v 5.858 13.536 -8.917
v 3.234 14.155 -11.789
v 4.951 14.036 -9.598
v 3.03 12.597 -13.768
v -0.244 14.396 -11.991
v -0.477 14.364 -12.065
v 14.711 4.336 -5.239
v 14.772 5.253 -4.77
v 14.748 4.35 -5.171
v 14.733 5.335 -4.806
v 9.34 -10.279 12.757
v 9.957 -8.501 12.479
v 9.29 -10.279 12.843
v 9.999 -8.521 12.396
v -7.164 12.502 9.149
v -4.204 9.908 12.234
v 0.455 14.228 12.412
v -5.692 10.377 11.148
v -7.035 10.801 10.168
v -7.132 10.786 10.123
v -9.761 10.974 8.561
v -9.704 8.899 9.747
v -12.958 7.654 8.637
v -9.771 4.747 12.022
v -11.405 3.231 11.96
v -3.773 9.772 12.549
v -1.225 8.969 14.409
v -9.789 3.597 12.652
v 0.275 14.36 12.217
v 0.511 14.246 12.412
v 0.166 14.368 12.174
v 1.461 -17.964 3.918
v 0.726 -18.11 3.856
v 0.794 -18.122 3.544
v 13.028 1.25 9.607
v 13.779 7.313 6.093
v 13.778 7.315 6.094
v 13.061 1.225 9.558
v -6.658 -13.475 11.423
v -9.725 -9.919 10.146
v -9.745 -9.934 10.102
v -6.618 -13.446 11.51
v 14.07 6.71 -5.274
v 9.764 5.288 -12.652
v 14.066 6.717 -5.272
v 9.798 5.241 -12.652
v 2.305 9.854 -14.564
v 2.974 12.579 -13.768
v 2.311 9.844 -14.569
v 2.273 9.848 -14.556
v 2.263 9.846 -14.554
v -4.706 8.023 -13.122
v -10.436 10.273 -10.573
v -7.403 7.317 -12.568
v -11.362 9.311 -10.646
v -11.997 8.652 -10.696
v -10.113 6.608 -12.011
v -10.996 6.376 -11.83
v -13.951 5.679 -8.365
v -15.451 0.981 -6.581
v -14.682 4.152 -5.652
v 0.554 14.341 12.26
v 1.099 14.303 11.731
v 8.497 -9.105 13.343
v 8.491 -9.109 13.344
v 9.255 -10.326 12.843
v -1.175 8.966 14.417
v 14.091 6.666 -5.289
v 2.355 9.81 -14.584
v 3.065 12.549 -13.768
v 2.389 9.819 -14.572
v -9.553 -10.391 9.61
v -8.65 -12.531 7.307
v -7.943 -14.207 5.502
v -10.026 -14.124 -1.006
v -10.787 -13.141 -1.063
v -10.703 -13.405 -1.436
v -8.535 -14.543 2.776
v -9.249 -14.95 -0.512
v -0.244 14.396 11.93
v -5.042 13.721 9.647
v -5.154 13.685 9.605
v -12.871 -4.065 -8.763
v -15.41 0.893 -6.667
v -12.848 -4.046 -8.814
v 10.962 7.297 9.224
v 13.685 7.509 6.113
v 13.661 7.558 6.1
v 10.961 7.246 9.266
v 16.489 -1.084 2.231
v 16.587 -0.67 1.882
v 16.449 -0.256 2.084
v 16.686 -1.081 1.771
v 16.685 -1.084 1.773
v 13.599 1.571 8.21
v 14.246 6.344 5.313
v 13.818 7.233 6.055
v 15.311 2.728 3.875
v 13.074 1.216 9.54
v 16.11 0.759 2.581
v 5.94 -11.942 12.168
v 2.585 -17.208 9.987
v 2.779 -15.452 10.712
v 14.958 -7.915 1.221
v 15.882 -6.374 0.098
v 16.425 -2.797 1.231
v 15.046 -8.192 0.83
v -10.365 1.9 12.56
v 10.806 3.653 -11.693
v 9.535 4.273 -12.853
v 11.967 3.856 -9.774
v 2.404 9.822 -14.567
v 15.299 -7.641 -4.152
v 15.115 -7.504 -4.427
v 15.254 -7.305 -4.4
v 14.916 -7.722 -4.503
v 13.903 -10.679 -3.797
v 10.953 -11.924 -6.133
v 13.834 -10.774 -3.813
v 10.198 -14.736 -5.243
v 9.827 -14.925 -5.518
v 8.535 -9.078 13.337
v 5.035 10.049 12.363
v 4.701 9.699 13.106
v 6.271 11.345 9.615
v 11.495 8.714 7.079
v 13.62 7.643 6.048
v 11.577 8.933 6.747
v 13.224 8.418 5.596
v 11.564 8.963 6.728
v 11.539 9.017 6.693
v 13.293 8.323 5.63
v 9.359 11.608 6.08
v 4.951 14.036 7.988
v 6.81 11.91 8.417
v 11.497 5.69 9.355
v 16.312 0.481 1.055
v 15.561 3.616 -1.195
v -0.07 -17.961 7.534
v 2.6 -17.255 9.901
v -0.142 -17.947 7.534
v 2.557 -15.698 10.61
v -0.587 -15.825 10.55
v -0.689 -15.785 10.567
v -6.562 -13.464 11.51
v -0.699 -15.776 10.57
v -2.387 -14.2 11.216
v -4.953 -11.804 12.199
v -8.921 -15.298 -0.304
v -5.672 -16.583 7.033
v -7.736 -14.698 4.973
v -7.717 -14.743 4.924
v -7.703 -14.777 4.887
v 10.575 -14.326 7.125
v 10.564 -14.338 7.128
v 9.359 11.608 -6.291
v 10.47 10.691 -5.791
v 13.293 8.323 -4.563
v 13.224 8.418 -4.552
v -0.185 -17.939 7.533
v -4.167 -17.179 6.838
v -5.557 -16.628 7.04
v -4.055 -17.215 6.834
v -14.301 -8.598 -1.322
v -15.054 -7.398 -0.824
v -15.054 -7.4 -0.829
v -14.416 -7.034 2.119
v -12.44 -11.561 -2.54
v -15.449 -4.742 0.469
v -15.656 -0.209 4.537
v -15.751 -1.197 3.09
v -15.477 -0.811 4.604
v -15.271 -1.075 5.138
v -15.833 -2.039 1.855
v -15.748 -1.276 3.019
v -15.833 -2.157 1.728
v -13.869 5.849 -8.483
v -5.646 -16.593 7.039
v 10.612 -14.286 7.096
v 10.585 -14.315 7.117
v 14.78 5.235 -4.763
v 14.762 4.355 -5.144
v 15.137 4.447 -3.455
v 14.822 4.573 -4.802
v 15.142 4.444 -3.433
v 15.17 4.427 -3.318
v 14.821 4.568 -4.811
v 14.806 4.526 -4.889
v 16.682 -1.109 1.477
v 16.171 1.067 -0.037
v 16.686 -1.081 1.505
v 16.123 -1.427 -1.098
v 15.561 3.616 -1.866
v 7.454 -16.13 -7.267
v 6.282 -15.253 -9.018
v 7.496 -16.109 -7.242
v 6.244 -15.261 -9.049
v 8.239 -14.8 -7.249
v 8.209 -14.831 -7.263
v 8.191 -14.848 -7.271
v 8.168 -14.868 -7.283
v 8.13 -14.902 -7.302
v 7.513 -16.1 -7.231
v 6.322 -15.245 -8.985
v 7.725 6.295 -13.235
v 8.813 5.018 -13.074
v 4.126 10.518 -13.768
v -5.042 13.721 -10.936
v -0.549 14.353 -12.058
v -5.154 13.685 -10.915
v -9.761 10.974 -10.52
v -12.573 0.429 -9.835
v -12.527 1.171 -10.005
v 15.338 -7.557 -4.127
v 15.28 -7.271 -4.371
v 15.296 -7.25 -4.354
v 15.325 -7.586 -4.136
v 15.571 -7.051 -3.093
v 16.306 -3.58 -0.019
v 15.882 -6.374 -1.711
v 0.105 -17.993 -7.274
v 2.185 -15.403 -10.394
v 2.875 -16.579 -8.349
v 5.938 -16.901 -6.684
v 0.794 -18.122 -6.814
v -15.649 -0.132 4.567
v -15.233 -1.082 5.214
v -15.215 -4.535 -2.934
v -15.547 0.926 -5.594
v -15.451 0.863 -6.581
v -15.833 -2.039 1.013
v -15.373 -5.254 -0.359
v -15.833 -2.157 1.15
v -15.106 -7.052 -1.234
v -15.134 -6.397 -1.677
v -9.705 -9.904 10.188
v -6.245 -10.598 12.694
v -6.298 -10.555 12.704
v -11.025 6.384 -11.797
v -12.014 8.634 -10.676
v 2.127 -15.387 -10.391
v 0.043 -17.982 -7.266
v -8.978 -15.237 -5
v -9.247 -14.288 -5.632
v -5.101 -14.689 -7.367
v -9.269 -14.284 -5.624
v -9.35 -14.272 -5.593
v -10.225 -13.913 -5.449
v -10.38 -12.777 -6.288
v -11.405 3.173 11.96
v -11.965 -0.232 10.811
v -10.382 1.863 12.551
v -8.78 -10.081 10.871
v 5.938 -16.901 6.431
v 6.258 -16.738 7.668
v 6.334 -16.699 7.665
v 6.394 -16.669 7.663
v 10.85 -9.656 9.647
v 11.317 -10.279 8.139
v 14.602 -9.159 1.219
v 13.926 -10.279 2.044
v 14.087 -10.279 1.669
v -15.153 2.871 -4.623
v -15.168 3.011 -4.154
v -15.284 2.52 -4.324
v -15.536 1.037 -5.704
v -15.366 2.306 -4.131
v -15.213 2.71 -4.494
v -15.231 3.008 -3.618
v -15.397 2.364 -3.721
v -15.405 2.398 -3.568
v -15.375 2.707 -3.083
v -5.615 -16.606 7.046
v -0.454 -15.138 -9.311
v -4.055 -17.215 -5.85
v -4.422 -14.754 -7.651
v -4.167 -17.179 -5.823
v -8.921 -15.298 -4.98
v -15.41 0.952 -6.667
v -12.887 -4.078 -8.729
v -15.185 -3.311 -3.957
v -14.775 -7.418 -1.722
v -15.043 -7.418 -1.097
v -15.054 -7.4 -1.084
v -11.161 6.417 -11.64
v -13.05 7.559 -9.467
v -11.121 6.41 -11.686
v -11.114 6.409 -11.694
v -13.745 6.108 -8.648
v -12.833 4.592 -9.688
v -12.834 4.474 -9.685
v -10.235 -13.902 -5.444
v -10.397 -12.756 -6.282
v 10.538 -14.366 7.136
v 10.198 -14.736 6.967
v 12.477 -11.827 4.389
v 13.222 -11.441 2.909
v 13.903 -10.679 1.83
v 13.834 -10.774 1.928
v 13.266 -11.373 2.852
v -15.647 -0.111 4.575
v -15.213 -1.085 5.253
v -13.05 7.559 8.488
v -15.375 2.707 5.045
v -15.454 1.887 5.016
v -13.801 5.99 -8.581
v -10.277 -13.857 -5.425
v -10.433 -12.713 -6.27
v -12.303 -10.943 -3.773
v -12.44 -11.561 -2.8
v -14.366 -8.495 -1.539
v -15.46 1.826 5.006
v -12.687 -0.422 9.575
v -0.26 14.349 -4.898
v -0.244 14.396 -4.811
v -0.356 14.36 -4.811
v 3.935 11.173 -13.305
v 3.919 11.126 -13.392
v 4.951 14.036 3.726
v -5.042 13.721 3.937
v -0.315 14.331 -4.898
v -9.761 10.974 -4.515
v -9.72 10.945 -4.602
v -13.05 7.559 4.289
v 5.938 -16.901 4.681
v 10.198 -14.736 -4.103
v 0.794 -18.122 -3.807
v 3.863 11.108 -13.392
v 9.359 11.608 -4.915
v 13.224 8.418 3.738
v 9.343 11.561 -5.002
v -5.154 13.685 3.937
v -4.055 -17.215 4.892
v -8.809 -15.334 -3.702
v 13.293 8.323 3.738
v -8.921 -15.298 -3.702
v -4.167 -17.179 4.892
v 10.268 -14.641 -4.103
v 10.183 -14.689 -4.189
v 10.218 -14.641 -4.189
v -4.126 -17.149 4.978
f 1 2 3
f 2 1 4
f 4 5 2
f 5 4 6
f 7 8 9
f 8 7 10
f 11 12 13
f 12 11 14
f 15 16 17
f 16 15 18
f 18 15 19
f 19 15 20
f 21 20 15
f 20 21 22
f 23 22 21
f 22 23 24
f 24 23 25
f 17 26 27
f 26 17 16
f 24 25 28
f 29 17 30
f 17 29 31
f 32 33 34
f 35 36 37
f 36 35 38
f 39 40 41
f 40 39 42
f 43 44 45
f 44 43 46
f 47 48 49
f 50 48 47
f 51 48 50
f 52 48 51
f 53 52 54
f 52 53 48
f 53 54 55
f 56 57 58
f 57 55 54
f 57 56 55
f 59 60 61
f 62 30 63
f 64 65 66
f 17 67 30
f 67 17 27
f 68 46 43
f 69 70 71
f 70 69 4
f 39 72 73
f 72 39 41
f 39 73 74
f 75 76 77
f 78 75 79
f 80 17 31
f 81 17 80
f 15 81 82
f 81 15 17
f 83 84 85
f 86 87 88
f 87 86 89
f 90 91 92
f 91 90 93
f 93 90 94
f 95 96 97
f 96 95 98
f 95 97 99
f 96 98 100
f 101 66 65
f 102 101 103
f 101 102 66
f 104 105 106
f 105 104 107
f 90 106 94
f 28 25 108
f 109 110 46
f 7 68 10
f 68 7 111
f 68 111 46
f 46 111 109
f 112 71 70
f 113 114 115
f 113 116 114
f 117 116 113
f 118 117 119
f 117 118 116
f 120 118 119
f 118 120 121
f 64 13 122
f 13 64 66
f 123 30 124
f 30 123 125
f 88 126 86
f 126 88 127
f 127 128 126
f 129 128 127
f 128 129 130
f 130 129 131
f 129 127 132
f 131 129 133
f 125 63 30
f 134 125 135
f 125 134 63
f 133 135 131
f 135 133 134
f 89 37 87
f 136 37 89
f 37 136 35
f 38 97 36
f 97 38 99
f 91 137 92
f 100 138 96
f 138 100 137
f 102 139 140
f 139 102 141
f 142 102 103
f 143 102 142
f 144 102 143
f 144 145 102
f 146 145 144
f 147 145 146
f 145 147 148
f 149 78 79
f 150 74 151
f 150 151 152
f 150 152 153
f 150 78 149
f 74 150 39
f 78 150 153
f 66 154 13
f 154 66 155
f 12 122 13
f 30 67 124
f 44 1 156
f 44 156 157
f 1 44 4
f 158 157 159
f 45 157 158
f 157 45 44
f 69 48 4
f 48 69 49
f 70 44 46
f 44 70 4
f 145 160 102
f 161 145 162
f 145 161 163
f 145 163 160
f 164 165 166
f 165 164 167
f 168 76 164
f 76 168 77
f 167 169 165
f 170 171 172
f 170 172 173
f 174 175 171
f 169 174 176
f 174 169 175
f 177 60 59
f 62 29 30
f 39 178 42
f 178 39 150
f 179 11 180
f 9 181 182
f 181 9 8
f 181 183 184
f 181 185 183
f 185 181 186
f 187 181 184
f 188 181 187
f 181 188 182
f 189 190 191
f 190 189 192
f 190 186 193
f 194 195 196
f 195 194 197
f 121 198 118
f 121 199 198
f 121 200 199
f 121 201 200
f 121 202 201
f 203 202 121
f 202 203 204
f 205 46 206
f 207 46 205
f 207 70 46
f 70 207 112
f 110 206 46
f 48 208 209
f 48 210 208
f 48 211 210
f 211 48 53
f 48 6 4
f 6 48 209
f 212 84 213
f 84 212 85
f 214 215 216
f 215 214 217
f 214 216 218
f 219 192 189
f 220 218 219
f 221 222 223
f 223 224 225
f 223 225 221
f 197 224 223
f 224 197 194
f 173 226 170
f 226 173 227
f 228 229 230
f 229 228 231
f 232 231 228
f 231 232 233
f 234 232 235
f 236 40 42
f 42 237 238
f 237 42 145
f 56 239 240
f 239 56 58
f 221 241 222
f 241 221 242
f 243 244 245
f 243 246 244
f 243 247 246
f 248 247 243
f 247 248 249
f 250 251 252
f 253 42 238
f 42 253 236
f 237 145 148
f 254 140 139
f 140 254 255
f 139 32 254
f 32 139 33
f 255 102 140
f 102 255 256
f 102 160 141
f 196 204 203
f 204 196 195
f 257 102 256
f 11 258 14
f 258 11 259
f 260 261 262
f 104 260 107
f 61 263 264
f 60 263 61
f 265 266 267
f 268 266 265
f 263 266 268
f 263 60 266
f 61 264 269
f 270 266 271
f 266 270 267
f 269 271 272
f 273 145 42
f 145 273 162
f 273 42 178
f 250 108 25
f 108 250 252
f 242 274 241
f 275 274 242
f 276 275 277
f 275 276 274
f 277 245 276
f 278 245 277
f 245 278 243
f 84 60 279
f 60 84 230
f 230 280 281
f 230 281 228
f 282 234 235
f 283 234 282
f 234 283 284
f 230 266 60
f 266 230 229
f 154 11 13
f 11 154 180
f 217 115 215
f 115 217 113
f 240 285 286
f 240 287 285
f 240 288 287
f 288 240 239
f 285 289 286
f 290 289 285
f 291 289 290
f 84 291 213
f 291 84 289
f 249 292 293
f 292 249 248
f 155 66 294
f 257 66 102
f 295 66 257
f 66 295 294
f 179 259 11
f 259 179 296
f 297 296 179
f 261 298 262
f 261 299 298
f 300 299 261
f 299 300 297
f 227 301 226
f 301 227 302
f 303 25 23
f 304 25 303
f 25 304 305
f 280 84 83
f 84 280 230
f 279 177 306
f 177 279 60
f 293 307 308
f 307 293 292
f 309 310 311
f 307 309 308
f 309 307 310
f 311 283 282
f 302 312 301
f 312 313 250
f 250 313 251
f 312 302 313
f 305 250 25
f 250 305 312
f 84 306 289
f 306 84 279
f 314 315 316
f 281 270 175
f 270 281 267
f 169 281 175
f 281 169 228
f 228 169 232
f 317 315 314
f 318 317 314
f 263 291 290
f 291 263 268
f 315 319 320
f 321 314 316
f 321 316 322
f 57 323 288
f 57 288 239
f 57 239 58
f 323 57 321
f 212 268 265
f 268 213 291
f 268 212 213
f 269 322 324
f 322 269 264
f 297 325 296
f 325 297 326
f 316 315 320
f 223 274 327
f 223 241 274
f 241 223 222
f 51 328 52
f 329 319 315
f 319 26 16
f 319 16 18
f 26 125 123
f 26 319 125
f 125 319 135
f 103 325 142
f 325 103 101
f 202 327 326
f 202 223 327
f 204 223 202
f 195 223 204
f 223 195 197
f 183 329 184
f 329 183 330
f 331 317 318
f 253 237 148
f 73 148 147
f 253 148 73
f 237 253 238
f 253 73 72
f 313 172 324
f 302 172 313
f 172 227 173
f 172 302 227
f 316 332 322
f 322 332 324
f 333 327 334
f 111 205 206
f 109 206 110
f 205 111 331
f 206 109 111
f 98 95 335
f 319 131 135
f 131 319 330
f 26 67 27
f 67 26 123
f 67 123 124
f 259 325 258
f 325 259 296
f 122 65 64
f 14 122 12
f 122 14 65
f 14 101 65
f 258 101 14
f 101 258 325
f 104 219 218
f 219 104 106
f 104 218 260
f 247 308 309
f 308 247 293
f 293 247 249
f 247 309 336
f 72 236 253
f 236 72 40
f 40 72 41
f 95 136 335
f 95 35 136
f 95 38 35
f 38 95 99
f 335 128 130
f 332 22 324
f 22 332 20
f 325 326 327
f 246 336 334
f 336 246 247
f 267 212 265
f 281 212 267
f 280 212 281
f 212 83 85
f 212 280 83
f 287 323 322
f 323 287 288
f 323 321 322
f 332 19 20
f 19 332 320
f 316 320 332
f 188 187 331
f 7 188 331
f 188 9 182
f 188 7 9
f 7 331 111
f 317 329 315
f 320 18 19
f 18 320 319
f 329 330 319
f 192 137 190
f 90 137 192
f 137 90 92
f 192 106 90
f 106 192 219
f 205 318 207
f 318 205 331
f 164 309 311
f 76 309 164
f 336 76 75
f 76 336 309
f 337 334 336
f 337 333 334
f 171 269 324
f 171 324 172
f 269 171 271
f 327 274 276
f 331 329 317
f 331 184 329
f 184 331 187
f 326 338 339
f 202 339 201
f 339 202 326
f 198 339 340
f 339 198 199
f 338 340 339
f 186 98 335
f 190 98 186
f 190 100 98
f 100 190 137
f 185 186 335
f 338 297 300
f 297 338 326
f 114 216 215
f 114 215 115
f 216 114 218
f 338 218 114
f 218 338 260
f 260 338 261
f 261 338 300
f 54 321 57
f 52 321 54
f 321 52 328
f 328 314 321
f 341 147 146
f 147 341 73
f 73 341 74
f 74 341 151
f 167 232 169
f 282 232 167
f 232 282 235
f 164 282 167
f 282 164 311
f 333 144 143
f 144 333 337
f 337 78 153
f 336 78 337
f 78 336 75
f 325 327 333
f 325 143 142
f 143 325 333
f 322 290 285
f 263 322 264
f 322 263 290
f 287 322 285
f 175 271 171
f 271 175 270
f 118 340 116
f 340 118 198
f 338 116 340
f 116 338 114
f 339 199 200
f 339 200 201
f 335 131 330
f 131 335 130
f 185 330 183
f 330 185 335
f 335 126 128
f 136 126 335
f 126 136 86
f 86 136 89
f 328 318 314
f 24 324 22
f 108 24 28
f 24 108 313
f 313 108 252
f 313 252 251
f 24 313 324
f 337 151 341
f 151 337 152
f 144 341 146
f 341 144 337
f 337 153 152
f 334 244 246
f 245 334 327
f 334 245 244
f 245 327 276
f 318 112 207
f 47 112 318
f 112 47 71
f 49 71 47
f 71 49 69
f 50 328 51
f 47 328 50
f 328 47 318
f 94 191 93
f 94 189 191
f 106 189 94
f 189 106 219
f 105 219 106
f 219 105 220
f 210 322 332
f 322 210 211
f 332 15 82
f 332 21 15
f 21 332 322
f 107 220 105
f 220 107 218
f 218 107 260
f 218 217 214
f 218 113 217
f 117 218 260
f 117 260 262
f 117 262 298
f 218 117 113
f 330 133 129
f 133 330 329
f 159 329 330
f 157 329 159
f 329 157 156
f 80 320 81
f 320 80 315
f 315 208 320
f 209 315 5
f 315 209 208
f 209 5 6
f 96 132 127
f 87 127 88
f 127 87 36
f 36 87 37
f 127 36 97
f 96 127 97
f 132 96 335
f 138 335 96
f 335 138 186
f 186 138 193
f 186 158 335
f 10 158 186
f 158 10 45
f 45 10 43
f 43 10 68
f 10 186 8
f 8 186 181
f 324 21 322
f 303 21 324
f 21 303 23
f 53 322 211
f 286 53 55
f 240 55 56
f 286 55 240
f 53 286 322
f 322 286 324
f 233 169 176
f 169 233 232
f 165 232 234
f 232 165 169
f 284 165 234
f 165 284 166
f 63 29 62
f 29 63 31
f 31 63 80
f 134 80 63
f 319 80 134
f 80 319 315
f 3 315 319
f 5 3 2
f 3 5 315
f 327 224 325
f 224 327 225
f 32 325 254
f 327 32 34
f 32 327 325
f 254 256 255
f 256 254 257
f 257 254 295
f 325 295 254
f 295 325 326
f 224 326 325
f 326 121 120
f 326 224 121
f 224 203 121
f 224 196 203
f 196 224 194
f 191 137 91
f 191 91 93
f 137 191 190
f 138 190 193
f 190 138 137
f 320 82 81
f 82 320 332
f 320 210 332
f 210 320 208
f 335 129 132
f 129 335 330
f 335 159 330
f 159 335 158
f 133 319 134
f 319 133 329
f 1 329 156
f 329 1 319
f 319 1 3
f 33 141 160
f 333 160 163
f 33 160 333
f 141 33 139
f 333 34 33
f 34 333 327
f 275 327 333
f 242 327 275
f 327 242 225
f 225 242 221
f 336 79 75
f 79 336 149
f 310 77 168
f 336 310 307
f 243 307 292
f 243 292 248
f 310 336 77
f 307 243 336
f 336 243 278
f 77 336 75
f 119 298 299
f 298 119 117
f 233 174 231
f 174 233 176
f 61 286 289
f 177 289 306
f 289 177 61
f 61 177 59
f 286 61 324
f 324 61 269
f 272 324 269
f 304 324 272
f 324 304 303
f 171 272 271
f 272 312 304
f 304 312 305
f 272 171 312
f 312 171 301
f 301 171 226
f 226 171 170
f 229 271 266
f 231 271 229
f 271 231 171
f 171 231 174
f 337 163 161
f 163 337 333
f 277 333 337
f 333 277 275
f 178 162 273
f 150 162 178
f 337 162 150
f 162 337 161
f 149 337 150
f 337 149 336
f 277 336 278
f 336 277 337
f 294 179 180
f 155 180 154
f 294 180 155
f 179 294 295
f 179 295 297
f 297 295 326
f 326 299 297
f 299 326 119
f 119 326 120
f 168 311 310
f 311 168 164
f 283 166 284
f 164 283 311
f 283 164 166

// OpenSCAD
// Auto-generated OpenSCAD file

    inner_points = 10*[[0.6684524443178234, 0.2912194859296234, -1.8363167690860016], [0.5910161587361856, -0.7871337989465796, 1.8171417764513753], [-0.2918345035641626, 0.5700386873175909, -1.8258845754108513], [0.7005256026010808, -0.7077839963284758, -1.8052788091992973], [0.8693085877915654, 0.17268677431141555, 1.78111690891311], [-0.4082680905441584, -0.8185618492857674, 1.8381956785148106], [-0.8532513180248714, -0.25664505176664254, -1.7883991652556823], [-0.2399390433352969, -1.0463829018555162, -1.7756641013727077], [0.04201851847921482, 0.7344604613470775, 1.7799062183976844], [-0.747567291966454, 0.12183512066246743, 1.8151828380475596], [-1.0794361675796518, -1.0564562485718862, -1.2323933529687556], [-0.785395180165941, 0.954977290682234, 1.26341914278561], [-1.1313316278085175, 0.5599653406012208, -1.2826138270068992], [0.4743407530463006, -1.5075951931337195, -1.2492729969123706], [0.8314806995920784, 1.005828944331182, 1.2293532136511605], [-1.2356817891893142, -0.598045019950611, 1.3217086029027356], [0.3903721345341776, 1.107829878297487, -1.3305314308372185], [1.3827322406994211, -0.1699928053485799, -1.3099256646256645], [1.3804783398490494, -0.5157653159624755, 1.266588771704851], [0.10290166151332539, -1.5070139395596582, 1.3236675413065515], [-0.9679627459509822, 1.0915308609299377, -0.45150089482603184], [1.0167574663795047, -1.4641145063621959, -0.41028936240292346], [1.3192715310196481, 0.8322870325903506, 0.3738163590127774], [-1.2358818256517996, -1.1502102146040154, 0.4879738982161779], [0.9327888478673815, 1.1513105650690107, -0.49154779632777174], [-1.4973064021284335, -0.7341563604123948, -0.38297752478415814], [1.546101122556956, 0.36157271498013704, -0.4788127324447971], [-0.8839941274388591, -1.5238942105012685, -0.3702424609011835], [-0.5073027875730468, 1.3626326692868251, 0.393659570560787], [-1.2968885980187155, 0.7500073286022151, 0.4289361902106621], [1.380278303386564, -1.0679305106158798, 0.43285406701829315], [0.5906924929408951, -1.6805558513004897, 0.46813068666816826], [-0.027498100014604697, 1.4301297664569783, -0.4811156026526214], [-1.5293795604116909, 0.2648471218457043, -0.4140154846708627], [1.5781742808402135, -0.6374307672779622, -0.44777477255809256], [0.07629282044312705, -1.8027134118892363, -0.38067465457633387], [0.49198146170729756, 1.3940607196260126, 0.3726056684973519], [-1.5751810270740951, -0.2098132446557805, 0.4649610577489272], [1.6585707324419436, -0.10810993735788438, 0.39682919948002804], [-0.40859175633944894, -1.7119839016396772, 0.48918458873160336]];

    outer_points = 10*[[1.104376346611005, -1.5961573617657159, 0.4728512902850581], [-0.673634048825412, 1.769605898412857, 0.6369190794461355], [0.893817731891513, -1.7160073529394246, -0.4973554141769706], [0.2569582435104783, -1.7160073529394246, 0.990073233123108], [0.2858087158543201, 1.9345652594329796, 0.40831901270173326], [-1.1703713108325864, 1.6046465373927346, -0.21516102344645555], [-0.08373275172975375, -1.9099287122098603, -0.5797541908094787], [-0.4773335616071019, -1.9099287122098603, 0.3395272690622494], [0.3820396926793872, 1.8715563902857573, -0.585043701269393], [-0.5179290575518498, 1.667655406539957, -0.9703755549159867], [-0.9984278133317204, -1.5355652274301959, -0.42748822105720446], [0.3014721351224021, 1.2549195998361895, -1.3681579568754045], [0.3727234801668946, -1.3416438681597602, -1.2643709042964242], [-0.6577368180914882, -1.3416438681597602, 1.1423392028753823], [1.1052099085285718, 1.5218294527292122, 0.010536610742315433], [-1.2509388683895712, 0.9880097469431668, -0.9982752790524669], [1.5608325785076533, -1.0278725177156156, -0.21176542320188751], [0.9239730901266188, -1.0278725177156156, 1.275663224098191], [0.04953616702377289, 1.419878960856312, 1.2324993914578442], [-1.4066438596631334, 1.089960238816067, 0.6090193553096552], [0.7176843678750273, -0.42213967519526474, -1.452822556112823], [-0.556034608887042, -0.42213967519526474, 1.5220347384873343], [1.3753551471929137, 0.7520583972355097, 0.5888739449609331], [-1.537004906180899, 0.09222095315501971, -0.6580861273354446], [1.6625347877120995, -0.10836832475112018, 0.1679301124100645], [-1.1072842188467662, -0.7359110256394092, -1.0179993899072812], [1.2689339778347515, -0.10836832475112018, 1.0872115722817925], [-1.5008850287241142, -0.7359110256394092, -0.09871793003555307], [0.9748488620108067, 0.524090167068165, -1.2565688719027843], [0.07488011177956955, 0.3201891833223645, -1.641900725549378], [-0.23652987076755477, 0.524090167068165, 1.5726885431748667], [-1.136498620998792, 0.3201891833223645, 1.187356689528273], [1.4519761729926075, -0.228218315924829, -0.8022765920519641], [-0.2598661157462394, -0.6160610344657005, -1.5352213327453308], [0.4215158747342246, -0.228218315924829, 1.6044335151198423], [-1.2903264140046222, -0.6160610344657005, 0.8714887744264755], [1.4715861240179806, 0.6890495280882876, -0.4044887690101932], [-0.8845626529001624, 0.15522982230224197, -1.4133006588049757], [0.7229128939121772, 0.6890495280882876, 1.3440884764304641], [-1.633235883005966, 0.15522982230224197, 0.3352765866356817]];

    // Convex hull for inner set (I)
    module inner_hull() {
        hull() {
            for (p = inner_points) {
                translate(p) sphere(r=0.1);
            }
        }
    }

    // Convex hull for outer set (O) minus inner hull (O \ I)
    module outer_minus_inner() {
        difference() {
            hull() {
                for (p = outer_points) {
                    translate(p) sphere(r=0.1);
                }
            }
            inner_hull(); // Subtract inner hull
        }
    }

    // Convex hull for outer set (O) minus all translated inner hulls
    module outer_minus_AllTranslationInner() {
        difference() {
            hull() {
                for (p = outer_points) {
                    translate(p) sphere(r=0.1);
                }
            }
            hull() {
                translate([0,0,50]) inner_hull();
                translate([0,0,-50]) inner_hull();
            }; // Subtract translated inner hulls
        }
    }

    // Difference between outer_minus_inner and outer_minus_AllTranslationInner
    module outer_minus_inner_diff() {
        difference() {
            // Outer minus inner
            difference() {
                hull() {
                    for (p = outer_points) {
                        translate(p) sphere(r=0.1);
                    }
                }
                inner_hull();
            }

            // Subtract Outer minus AllTranslationInner
            difference() {
                hull() {
                    for (p = outer_points) {
                        translate(p) sphere(r=0.1);
                    }
                }
                hull() {
                    translate([0,0,50]) inner_hull();
                    translate([0,0,-50]) inner_hull();
                };
            }
        }
    }

    // Rendering all with colors applied
    color([1, 1, 0, 1]) outer_minus_inner_diff(); // Opaque yellow
    
